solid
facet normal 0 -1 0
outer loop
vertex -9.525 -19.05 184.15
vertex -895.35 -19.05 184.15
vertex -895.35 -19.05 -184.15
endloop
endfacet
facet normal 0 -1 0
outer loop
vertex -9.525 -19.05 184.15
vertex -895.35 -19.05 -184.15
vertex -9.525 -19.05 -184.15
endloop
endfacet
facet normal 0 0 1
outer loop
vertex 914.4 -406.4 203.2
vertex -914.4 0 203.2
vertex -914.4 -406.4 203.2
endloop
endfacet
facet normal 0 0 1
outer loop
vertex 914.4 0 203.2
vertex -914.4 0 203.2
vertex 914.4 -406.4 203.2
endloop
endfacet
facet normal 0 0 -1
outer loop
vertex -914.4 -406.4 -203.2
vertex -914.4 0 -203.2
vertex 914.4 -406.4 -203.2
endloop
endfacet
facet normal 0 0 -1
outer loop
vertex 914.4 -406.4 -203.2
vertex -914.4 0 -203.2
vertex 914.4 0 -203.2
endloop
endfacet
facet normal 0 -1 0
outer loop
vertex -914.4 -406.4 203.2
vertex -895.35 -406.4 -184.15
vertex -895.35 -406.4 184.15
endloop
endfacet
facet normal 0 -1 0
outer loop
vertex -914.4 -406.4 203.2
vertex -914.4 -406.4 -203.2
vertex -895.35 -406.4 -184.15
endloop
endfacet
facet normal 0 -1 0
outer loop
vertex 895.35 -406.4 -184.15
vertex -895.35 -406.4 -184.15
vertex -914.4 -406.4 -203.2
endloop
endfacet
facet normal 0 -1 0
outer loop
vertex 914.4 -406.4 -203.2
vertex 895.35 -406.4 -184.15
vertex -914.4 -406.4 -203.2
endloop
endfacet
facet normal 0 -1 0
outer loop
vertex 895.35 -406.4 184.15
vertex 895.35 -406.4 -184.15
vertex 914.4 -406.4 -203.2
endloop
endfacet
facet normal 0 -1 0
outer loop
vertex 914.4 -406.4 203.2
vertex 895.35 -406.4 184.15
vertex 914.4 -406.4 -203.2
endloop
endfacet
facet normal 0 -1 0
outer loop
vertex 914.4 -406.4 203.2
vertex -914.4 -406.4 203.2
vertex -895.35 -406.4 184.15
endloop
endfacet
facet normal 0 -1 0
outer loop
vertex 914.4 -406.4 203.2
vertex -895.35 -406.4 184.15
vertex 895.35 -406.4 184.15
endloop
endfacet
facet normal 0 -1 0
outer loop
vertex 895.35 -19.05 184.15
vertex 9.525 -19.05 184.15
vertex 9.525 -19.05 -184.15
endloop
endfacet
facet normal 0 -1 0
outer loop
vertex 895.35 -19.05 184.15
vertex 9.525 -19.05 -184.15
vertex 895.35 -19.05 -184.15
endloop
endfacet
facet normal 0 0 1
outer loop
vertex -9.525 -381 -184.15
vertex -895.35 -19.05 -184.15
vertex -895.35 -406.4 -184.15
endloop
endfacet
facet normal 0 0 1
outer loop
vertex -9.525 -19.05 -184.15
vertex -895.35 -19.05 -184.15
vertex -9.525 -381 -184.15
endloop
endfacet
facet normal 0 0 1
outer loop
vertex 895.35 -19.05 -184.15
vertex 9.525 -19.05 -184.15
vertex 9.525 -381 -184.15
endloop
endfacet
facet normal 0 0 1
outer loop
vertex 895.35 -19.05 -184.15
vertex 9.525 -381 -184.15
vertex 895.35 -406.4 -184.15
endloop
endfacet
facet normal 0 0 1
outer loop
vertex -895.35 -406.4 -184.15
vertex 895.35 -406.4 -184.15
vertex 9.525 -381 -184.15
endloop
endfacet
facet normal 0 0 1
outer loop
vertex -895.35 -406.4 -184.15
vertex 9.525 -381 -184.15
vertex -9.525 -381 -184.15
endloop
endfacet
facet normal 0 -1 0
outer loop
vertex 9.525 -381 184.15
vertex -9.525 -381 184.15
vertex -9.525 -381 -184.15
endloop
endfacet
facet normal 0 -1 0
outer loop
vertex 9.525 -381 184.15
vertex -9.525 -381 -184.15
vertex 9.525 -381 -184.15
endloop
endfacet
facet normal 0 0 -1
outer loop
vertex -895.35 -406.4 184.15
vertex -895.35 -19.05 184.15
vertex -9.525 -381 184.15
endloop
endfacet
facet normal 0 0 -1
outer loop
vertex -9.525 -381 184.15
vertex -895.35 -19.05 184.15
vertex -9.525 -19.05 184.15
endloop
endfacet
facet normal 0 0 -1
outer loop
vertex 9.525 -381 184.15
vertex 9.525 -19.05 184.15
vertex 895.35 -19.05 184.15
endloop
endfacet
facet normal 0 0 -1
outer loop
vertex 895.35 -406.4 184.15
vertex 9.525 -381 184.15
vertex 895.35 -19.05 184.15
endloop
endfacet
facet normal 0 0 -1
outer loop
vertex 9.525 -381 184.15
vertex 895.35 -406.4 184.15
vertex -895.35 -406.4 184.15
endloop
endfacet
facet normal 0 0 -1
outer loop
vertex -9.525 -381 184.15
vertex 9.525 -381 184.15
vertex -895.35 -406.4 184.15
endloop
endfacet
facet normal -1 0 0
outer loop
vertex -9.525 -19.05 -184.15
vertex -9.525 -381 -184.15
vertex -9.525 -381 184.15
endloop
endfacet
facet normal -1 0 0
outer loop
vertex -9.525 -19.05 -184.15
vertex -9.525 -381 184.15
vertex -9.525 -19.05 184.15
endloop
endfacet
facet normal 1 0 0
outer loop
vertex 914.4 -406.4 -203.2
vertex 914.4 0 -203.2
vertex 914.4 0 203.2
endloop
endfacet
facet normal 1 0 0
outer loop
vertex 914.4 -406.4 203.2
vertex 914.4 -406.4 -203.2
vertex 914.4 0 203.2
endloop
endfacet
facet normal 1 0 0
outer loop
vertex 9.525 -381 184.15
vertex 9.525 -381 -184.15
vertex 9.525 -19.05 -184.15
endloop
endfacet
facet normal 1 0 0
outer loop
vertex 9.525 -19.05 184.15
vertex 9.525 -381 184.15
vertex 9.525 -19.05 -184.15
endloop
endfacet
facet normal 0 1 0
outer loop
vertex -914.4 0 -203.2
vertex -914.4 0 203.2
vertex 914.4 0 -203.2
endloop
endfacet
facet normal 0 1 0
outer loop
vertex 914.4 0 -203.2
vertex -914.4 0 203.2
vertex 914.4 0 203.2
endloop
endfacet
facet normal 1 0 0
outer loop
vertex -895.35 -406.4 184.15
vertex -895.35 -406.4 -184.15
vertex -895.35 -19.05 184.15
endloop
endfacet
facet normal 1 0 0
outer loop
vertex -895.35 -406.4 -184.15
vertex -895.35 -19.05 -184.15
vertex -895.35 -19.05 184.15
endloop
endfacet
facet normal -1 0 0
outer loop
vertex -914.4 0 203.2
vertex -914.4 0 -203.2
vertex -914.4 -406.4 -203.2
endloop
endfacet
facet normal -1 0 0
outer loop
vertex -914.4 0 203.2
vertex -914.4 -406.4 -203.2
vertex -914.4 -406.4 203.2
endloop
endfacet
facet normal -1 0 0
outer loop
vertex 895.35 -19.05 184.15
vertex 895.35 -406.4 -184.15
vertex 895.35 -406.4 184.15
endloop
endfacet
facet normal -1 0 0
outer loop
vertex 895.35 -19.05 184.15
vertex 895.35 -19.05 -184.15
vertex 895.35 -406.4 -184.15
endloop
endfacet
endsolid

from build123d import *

# Parameters (mm, degrees)
F0_W     = 1828.8
F0_H     = 406.4
F1_DEPTH = 406.4
F2_T     = -19.05
F3_W     = 19.05
F3_H     = 387.35
F4_DEPTH = 368.3
F5_W     = 19.05
F5_H     = 368.3
F6_DEPTH = 25.4


with BuildPart() as f1:
    # F0 (on Front) → F1 (new body)
    with BuildSketch(Plane.XZ):
        Rectangle(F0_W, F0_H)
    extrude(amount=F1_DEPTH)

    # F2
    f2_openings = [f1.faces().sort_by_distance(p)[0] for p in [
        (0, -406.4, 0),
    ]]
    offset(amount=F2_T, openings=f2_openings)

    # F3 (on face) → F4 (join)
    with BuildSketch(Plane.XY.offset(-184.15)):
        with Locations((0, -212.725)):
            Rectangle(F3_W, F3_H)
    extrude(amount=F4_DEPTH)

    # F5 (on face) → F6 (cut)
    with BuildSketch(Plane.XZ.offset(406.4)):
        Rectangle(F5_W, F5_H)
    extrude(amount=-F6_DEPTH, mode=Mode.SUBTRACT)


solid = f1.part
